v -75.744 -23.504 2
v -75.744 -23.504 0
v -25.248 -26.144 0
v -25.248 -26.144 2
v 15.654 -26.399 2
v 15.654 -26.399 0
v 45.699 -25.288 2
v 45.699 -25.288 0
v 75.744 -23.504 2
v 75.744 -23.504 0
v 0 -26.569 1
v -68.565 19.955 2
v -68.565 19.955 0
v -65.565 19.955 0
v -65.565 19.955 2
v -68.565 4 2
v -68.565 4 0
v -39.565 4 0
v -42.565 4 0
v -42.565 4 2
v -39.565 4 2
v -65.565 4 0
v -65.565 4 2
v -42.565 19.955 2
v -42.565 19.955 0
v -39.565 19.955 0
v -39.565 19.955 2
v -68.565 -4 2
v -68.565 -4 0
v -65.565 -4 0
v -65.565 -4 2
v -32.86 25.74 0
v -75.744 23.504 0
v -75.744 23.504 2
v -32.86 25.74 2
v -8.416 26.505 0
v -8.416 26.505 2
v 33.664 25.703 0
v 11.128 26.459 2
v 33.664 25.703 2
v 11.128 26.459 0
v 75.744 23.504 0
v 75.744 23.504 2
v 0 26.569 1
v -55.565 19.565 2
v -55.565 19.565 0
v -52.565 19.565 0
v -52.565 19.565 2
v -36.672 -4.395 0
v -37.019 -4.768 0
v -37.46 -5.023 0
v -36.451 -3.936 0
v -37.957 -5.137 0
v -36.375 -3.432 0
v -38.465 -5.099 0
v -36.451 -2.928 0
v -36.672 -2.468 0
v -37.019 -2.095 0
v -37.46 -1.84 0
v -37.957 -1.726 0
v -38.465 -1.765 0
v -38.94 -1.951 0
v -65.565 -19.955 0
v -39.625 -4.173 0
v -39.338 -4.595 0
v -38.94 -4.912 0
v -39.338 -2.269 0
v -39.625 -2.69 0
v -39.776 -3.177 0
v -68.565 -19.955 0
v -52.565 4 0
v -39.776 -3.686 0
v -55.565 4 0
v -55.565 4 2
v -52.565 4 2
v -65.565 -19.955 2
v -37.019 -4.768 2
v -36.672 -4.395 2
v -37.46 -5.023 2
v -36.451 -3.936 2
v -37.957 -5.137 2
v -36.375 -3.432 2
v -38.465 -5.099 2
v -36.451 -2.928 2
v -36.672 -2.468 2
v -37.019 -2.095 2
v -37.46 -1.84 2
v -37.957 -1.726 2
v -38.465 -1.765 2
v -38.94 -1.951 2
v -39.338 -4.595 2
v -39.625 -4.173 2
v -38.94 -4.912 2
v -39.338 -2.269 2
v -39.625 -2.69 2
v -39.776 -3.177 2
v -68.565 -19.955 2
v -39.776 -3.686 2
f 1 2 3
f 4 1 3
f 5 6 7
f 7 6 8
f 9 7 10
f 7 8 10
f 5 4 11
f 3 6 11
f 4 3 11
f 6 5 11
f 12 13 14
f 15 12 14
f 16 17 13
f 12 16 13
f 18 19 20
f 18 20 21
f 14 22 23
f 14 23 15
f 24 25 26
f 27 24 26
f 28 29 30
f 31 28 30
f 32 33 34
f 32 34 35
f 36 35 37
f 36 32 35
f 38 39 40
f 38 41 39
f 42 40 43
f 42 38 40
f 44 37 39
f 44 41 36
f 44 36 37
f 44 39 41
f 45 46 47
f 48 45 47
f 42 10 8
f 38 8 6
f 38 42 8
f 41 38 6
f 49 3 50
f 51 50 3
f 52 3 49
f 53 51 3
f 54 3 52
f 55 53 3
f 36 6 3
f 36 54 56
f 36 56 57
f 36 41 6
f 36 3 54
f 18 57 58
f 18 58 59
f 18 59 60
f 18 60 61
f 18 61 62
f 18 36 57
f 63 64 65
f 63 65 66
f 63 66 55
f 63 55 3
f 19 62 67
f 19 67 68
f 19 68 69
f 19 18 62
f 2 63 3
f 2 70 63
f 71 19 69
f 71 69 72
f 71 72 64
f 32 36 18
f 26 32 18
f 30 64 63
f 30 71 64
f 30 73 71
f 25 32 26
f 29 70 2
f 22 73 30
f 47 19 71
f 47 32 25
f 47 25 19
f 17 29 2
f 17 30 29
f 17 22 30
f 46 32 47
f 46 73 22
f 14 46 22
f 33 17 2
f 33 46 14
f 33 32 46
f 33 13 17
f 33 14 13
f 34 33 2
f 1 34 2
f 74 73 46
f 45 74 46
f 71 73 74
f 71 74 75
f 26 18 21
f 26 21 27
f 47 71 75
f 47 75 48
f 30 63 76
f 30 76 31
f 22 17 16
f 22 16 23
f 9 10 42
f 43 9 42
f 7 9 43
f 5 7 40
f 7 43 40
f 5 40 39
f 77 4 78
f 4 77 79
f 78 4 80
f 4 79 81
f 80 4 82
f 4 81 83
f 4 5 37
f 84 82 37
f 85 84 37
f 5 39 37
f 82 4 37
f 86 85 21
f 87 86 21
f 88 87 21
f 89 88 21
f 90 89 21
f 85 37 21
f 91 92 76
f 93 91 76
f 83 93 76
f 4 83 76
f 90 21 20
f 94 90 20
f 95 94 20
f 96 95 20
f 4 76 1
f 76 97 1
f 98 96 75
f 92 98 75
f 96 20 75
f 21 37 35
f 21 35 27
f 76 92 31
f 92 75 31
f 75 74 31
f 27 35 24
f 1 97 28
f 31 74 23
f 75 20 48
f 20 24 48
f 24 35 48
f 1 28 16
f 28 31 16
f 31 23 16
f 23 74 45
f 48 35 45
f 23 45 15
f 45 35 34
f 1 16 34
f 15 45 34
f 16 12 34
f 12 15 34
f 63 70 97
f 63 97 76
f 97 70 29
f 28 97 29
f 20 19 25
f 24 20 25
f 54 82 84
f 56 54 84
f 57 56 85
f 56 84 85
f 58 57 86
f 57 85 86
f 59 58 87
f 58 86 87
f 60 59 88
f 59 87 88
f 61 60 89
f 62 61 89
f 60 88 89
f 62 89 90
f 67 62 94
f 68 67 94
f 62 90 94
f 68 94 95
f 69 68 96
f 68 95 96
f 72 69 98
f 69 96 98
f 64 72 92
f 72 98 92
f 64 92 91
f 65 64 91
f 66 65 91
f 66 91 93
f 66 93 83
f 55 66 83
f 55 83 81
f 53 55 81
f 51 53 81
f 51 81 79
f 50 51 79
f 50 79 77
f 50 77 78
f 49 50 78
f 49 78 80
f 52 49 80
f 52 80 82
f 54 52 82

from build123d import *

# Parameters (mm, degrees)
F0_W     = 3
F0_H     = 15.95455
F0_H_2   = 15.564595
F1_DEPTH = 2
F2_R     = 1.709906
F3_DEPTH = 25


with BuildPart() as f1:
    # F0 (on Top) → F1 (new body)
    with BuildSketch(Plane.XY):
        with BuildLine():
            add(Edge.make_bspline(
                [(-75.74358, 23.504223), (-50.49572, 24.757731), (0, 28.379784), (50.49572, 24.757731), (75.74358, 23.504223)],
                knots=[0, 0, 0, 0, 75.805549, 151.611099, 151.611099, 151.611099, 151.611099], degree=3))
            Line((-75.74358, 23.504223), (-75.74358, -23.504223))
            add(Edge.make_bspline(
                [(-75.74358, -23.504223), (-50.49572, -25.16658), (0, -27.970934), (50.49572, -25.16658), (75.74358, -23.504223)],
                knots=[0, 0, 0, 0, 75.805549, 151.611099, 151.611099, 151.611099, 151.611099], degree=3))
            Line((75.74358, -23.504223), (75.74358, 23.504223))
        make_face()
        with Locations((-67.065108, -11.977275)):
            Rectangle(F0_W, F0_H, mode=Mode.SUBTRACT)
        with Locations((-67.065108, 11.977275)):
            Rectangle(F0_W, F0_H, mode=Mode.SUBTRACT)
        with Locations((-54.065108, 11.782298)):
            Rectangle(F0_W, F0_H_2, mode=Mode.SUBTRACT)
        with Locations((-41.065108, 11.977275)):
            Rectangle(F0_W, F0_H, mode=Mode.SUBTRACT)
    extrude(amount=F1_DEPTH)

    # F2 (on face) → F3 (cut)
    with BuildSketch(Plane.XY.offset(2)):
        with Locations((-38.084775, -3.431539)):
            Circle(F2_R)
    extrude(amount=-F3_DEPTH, mode=Mode.SUBTRACT)


solid = f1.part
